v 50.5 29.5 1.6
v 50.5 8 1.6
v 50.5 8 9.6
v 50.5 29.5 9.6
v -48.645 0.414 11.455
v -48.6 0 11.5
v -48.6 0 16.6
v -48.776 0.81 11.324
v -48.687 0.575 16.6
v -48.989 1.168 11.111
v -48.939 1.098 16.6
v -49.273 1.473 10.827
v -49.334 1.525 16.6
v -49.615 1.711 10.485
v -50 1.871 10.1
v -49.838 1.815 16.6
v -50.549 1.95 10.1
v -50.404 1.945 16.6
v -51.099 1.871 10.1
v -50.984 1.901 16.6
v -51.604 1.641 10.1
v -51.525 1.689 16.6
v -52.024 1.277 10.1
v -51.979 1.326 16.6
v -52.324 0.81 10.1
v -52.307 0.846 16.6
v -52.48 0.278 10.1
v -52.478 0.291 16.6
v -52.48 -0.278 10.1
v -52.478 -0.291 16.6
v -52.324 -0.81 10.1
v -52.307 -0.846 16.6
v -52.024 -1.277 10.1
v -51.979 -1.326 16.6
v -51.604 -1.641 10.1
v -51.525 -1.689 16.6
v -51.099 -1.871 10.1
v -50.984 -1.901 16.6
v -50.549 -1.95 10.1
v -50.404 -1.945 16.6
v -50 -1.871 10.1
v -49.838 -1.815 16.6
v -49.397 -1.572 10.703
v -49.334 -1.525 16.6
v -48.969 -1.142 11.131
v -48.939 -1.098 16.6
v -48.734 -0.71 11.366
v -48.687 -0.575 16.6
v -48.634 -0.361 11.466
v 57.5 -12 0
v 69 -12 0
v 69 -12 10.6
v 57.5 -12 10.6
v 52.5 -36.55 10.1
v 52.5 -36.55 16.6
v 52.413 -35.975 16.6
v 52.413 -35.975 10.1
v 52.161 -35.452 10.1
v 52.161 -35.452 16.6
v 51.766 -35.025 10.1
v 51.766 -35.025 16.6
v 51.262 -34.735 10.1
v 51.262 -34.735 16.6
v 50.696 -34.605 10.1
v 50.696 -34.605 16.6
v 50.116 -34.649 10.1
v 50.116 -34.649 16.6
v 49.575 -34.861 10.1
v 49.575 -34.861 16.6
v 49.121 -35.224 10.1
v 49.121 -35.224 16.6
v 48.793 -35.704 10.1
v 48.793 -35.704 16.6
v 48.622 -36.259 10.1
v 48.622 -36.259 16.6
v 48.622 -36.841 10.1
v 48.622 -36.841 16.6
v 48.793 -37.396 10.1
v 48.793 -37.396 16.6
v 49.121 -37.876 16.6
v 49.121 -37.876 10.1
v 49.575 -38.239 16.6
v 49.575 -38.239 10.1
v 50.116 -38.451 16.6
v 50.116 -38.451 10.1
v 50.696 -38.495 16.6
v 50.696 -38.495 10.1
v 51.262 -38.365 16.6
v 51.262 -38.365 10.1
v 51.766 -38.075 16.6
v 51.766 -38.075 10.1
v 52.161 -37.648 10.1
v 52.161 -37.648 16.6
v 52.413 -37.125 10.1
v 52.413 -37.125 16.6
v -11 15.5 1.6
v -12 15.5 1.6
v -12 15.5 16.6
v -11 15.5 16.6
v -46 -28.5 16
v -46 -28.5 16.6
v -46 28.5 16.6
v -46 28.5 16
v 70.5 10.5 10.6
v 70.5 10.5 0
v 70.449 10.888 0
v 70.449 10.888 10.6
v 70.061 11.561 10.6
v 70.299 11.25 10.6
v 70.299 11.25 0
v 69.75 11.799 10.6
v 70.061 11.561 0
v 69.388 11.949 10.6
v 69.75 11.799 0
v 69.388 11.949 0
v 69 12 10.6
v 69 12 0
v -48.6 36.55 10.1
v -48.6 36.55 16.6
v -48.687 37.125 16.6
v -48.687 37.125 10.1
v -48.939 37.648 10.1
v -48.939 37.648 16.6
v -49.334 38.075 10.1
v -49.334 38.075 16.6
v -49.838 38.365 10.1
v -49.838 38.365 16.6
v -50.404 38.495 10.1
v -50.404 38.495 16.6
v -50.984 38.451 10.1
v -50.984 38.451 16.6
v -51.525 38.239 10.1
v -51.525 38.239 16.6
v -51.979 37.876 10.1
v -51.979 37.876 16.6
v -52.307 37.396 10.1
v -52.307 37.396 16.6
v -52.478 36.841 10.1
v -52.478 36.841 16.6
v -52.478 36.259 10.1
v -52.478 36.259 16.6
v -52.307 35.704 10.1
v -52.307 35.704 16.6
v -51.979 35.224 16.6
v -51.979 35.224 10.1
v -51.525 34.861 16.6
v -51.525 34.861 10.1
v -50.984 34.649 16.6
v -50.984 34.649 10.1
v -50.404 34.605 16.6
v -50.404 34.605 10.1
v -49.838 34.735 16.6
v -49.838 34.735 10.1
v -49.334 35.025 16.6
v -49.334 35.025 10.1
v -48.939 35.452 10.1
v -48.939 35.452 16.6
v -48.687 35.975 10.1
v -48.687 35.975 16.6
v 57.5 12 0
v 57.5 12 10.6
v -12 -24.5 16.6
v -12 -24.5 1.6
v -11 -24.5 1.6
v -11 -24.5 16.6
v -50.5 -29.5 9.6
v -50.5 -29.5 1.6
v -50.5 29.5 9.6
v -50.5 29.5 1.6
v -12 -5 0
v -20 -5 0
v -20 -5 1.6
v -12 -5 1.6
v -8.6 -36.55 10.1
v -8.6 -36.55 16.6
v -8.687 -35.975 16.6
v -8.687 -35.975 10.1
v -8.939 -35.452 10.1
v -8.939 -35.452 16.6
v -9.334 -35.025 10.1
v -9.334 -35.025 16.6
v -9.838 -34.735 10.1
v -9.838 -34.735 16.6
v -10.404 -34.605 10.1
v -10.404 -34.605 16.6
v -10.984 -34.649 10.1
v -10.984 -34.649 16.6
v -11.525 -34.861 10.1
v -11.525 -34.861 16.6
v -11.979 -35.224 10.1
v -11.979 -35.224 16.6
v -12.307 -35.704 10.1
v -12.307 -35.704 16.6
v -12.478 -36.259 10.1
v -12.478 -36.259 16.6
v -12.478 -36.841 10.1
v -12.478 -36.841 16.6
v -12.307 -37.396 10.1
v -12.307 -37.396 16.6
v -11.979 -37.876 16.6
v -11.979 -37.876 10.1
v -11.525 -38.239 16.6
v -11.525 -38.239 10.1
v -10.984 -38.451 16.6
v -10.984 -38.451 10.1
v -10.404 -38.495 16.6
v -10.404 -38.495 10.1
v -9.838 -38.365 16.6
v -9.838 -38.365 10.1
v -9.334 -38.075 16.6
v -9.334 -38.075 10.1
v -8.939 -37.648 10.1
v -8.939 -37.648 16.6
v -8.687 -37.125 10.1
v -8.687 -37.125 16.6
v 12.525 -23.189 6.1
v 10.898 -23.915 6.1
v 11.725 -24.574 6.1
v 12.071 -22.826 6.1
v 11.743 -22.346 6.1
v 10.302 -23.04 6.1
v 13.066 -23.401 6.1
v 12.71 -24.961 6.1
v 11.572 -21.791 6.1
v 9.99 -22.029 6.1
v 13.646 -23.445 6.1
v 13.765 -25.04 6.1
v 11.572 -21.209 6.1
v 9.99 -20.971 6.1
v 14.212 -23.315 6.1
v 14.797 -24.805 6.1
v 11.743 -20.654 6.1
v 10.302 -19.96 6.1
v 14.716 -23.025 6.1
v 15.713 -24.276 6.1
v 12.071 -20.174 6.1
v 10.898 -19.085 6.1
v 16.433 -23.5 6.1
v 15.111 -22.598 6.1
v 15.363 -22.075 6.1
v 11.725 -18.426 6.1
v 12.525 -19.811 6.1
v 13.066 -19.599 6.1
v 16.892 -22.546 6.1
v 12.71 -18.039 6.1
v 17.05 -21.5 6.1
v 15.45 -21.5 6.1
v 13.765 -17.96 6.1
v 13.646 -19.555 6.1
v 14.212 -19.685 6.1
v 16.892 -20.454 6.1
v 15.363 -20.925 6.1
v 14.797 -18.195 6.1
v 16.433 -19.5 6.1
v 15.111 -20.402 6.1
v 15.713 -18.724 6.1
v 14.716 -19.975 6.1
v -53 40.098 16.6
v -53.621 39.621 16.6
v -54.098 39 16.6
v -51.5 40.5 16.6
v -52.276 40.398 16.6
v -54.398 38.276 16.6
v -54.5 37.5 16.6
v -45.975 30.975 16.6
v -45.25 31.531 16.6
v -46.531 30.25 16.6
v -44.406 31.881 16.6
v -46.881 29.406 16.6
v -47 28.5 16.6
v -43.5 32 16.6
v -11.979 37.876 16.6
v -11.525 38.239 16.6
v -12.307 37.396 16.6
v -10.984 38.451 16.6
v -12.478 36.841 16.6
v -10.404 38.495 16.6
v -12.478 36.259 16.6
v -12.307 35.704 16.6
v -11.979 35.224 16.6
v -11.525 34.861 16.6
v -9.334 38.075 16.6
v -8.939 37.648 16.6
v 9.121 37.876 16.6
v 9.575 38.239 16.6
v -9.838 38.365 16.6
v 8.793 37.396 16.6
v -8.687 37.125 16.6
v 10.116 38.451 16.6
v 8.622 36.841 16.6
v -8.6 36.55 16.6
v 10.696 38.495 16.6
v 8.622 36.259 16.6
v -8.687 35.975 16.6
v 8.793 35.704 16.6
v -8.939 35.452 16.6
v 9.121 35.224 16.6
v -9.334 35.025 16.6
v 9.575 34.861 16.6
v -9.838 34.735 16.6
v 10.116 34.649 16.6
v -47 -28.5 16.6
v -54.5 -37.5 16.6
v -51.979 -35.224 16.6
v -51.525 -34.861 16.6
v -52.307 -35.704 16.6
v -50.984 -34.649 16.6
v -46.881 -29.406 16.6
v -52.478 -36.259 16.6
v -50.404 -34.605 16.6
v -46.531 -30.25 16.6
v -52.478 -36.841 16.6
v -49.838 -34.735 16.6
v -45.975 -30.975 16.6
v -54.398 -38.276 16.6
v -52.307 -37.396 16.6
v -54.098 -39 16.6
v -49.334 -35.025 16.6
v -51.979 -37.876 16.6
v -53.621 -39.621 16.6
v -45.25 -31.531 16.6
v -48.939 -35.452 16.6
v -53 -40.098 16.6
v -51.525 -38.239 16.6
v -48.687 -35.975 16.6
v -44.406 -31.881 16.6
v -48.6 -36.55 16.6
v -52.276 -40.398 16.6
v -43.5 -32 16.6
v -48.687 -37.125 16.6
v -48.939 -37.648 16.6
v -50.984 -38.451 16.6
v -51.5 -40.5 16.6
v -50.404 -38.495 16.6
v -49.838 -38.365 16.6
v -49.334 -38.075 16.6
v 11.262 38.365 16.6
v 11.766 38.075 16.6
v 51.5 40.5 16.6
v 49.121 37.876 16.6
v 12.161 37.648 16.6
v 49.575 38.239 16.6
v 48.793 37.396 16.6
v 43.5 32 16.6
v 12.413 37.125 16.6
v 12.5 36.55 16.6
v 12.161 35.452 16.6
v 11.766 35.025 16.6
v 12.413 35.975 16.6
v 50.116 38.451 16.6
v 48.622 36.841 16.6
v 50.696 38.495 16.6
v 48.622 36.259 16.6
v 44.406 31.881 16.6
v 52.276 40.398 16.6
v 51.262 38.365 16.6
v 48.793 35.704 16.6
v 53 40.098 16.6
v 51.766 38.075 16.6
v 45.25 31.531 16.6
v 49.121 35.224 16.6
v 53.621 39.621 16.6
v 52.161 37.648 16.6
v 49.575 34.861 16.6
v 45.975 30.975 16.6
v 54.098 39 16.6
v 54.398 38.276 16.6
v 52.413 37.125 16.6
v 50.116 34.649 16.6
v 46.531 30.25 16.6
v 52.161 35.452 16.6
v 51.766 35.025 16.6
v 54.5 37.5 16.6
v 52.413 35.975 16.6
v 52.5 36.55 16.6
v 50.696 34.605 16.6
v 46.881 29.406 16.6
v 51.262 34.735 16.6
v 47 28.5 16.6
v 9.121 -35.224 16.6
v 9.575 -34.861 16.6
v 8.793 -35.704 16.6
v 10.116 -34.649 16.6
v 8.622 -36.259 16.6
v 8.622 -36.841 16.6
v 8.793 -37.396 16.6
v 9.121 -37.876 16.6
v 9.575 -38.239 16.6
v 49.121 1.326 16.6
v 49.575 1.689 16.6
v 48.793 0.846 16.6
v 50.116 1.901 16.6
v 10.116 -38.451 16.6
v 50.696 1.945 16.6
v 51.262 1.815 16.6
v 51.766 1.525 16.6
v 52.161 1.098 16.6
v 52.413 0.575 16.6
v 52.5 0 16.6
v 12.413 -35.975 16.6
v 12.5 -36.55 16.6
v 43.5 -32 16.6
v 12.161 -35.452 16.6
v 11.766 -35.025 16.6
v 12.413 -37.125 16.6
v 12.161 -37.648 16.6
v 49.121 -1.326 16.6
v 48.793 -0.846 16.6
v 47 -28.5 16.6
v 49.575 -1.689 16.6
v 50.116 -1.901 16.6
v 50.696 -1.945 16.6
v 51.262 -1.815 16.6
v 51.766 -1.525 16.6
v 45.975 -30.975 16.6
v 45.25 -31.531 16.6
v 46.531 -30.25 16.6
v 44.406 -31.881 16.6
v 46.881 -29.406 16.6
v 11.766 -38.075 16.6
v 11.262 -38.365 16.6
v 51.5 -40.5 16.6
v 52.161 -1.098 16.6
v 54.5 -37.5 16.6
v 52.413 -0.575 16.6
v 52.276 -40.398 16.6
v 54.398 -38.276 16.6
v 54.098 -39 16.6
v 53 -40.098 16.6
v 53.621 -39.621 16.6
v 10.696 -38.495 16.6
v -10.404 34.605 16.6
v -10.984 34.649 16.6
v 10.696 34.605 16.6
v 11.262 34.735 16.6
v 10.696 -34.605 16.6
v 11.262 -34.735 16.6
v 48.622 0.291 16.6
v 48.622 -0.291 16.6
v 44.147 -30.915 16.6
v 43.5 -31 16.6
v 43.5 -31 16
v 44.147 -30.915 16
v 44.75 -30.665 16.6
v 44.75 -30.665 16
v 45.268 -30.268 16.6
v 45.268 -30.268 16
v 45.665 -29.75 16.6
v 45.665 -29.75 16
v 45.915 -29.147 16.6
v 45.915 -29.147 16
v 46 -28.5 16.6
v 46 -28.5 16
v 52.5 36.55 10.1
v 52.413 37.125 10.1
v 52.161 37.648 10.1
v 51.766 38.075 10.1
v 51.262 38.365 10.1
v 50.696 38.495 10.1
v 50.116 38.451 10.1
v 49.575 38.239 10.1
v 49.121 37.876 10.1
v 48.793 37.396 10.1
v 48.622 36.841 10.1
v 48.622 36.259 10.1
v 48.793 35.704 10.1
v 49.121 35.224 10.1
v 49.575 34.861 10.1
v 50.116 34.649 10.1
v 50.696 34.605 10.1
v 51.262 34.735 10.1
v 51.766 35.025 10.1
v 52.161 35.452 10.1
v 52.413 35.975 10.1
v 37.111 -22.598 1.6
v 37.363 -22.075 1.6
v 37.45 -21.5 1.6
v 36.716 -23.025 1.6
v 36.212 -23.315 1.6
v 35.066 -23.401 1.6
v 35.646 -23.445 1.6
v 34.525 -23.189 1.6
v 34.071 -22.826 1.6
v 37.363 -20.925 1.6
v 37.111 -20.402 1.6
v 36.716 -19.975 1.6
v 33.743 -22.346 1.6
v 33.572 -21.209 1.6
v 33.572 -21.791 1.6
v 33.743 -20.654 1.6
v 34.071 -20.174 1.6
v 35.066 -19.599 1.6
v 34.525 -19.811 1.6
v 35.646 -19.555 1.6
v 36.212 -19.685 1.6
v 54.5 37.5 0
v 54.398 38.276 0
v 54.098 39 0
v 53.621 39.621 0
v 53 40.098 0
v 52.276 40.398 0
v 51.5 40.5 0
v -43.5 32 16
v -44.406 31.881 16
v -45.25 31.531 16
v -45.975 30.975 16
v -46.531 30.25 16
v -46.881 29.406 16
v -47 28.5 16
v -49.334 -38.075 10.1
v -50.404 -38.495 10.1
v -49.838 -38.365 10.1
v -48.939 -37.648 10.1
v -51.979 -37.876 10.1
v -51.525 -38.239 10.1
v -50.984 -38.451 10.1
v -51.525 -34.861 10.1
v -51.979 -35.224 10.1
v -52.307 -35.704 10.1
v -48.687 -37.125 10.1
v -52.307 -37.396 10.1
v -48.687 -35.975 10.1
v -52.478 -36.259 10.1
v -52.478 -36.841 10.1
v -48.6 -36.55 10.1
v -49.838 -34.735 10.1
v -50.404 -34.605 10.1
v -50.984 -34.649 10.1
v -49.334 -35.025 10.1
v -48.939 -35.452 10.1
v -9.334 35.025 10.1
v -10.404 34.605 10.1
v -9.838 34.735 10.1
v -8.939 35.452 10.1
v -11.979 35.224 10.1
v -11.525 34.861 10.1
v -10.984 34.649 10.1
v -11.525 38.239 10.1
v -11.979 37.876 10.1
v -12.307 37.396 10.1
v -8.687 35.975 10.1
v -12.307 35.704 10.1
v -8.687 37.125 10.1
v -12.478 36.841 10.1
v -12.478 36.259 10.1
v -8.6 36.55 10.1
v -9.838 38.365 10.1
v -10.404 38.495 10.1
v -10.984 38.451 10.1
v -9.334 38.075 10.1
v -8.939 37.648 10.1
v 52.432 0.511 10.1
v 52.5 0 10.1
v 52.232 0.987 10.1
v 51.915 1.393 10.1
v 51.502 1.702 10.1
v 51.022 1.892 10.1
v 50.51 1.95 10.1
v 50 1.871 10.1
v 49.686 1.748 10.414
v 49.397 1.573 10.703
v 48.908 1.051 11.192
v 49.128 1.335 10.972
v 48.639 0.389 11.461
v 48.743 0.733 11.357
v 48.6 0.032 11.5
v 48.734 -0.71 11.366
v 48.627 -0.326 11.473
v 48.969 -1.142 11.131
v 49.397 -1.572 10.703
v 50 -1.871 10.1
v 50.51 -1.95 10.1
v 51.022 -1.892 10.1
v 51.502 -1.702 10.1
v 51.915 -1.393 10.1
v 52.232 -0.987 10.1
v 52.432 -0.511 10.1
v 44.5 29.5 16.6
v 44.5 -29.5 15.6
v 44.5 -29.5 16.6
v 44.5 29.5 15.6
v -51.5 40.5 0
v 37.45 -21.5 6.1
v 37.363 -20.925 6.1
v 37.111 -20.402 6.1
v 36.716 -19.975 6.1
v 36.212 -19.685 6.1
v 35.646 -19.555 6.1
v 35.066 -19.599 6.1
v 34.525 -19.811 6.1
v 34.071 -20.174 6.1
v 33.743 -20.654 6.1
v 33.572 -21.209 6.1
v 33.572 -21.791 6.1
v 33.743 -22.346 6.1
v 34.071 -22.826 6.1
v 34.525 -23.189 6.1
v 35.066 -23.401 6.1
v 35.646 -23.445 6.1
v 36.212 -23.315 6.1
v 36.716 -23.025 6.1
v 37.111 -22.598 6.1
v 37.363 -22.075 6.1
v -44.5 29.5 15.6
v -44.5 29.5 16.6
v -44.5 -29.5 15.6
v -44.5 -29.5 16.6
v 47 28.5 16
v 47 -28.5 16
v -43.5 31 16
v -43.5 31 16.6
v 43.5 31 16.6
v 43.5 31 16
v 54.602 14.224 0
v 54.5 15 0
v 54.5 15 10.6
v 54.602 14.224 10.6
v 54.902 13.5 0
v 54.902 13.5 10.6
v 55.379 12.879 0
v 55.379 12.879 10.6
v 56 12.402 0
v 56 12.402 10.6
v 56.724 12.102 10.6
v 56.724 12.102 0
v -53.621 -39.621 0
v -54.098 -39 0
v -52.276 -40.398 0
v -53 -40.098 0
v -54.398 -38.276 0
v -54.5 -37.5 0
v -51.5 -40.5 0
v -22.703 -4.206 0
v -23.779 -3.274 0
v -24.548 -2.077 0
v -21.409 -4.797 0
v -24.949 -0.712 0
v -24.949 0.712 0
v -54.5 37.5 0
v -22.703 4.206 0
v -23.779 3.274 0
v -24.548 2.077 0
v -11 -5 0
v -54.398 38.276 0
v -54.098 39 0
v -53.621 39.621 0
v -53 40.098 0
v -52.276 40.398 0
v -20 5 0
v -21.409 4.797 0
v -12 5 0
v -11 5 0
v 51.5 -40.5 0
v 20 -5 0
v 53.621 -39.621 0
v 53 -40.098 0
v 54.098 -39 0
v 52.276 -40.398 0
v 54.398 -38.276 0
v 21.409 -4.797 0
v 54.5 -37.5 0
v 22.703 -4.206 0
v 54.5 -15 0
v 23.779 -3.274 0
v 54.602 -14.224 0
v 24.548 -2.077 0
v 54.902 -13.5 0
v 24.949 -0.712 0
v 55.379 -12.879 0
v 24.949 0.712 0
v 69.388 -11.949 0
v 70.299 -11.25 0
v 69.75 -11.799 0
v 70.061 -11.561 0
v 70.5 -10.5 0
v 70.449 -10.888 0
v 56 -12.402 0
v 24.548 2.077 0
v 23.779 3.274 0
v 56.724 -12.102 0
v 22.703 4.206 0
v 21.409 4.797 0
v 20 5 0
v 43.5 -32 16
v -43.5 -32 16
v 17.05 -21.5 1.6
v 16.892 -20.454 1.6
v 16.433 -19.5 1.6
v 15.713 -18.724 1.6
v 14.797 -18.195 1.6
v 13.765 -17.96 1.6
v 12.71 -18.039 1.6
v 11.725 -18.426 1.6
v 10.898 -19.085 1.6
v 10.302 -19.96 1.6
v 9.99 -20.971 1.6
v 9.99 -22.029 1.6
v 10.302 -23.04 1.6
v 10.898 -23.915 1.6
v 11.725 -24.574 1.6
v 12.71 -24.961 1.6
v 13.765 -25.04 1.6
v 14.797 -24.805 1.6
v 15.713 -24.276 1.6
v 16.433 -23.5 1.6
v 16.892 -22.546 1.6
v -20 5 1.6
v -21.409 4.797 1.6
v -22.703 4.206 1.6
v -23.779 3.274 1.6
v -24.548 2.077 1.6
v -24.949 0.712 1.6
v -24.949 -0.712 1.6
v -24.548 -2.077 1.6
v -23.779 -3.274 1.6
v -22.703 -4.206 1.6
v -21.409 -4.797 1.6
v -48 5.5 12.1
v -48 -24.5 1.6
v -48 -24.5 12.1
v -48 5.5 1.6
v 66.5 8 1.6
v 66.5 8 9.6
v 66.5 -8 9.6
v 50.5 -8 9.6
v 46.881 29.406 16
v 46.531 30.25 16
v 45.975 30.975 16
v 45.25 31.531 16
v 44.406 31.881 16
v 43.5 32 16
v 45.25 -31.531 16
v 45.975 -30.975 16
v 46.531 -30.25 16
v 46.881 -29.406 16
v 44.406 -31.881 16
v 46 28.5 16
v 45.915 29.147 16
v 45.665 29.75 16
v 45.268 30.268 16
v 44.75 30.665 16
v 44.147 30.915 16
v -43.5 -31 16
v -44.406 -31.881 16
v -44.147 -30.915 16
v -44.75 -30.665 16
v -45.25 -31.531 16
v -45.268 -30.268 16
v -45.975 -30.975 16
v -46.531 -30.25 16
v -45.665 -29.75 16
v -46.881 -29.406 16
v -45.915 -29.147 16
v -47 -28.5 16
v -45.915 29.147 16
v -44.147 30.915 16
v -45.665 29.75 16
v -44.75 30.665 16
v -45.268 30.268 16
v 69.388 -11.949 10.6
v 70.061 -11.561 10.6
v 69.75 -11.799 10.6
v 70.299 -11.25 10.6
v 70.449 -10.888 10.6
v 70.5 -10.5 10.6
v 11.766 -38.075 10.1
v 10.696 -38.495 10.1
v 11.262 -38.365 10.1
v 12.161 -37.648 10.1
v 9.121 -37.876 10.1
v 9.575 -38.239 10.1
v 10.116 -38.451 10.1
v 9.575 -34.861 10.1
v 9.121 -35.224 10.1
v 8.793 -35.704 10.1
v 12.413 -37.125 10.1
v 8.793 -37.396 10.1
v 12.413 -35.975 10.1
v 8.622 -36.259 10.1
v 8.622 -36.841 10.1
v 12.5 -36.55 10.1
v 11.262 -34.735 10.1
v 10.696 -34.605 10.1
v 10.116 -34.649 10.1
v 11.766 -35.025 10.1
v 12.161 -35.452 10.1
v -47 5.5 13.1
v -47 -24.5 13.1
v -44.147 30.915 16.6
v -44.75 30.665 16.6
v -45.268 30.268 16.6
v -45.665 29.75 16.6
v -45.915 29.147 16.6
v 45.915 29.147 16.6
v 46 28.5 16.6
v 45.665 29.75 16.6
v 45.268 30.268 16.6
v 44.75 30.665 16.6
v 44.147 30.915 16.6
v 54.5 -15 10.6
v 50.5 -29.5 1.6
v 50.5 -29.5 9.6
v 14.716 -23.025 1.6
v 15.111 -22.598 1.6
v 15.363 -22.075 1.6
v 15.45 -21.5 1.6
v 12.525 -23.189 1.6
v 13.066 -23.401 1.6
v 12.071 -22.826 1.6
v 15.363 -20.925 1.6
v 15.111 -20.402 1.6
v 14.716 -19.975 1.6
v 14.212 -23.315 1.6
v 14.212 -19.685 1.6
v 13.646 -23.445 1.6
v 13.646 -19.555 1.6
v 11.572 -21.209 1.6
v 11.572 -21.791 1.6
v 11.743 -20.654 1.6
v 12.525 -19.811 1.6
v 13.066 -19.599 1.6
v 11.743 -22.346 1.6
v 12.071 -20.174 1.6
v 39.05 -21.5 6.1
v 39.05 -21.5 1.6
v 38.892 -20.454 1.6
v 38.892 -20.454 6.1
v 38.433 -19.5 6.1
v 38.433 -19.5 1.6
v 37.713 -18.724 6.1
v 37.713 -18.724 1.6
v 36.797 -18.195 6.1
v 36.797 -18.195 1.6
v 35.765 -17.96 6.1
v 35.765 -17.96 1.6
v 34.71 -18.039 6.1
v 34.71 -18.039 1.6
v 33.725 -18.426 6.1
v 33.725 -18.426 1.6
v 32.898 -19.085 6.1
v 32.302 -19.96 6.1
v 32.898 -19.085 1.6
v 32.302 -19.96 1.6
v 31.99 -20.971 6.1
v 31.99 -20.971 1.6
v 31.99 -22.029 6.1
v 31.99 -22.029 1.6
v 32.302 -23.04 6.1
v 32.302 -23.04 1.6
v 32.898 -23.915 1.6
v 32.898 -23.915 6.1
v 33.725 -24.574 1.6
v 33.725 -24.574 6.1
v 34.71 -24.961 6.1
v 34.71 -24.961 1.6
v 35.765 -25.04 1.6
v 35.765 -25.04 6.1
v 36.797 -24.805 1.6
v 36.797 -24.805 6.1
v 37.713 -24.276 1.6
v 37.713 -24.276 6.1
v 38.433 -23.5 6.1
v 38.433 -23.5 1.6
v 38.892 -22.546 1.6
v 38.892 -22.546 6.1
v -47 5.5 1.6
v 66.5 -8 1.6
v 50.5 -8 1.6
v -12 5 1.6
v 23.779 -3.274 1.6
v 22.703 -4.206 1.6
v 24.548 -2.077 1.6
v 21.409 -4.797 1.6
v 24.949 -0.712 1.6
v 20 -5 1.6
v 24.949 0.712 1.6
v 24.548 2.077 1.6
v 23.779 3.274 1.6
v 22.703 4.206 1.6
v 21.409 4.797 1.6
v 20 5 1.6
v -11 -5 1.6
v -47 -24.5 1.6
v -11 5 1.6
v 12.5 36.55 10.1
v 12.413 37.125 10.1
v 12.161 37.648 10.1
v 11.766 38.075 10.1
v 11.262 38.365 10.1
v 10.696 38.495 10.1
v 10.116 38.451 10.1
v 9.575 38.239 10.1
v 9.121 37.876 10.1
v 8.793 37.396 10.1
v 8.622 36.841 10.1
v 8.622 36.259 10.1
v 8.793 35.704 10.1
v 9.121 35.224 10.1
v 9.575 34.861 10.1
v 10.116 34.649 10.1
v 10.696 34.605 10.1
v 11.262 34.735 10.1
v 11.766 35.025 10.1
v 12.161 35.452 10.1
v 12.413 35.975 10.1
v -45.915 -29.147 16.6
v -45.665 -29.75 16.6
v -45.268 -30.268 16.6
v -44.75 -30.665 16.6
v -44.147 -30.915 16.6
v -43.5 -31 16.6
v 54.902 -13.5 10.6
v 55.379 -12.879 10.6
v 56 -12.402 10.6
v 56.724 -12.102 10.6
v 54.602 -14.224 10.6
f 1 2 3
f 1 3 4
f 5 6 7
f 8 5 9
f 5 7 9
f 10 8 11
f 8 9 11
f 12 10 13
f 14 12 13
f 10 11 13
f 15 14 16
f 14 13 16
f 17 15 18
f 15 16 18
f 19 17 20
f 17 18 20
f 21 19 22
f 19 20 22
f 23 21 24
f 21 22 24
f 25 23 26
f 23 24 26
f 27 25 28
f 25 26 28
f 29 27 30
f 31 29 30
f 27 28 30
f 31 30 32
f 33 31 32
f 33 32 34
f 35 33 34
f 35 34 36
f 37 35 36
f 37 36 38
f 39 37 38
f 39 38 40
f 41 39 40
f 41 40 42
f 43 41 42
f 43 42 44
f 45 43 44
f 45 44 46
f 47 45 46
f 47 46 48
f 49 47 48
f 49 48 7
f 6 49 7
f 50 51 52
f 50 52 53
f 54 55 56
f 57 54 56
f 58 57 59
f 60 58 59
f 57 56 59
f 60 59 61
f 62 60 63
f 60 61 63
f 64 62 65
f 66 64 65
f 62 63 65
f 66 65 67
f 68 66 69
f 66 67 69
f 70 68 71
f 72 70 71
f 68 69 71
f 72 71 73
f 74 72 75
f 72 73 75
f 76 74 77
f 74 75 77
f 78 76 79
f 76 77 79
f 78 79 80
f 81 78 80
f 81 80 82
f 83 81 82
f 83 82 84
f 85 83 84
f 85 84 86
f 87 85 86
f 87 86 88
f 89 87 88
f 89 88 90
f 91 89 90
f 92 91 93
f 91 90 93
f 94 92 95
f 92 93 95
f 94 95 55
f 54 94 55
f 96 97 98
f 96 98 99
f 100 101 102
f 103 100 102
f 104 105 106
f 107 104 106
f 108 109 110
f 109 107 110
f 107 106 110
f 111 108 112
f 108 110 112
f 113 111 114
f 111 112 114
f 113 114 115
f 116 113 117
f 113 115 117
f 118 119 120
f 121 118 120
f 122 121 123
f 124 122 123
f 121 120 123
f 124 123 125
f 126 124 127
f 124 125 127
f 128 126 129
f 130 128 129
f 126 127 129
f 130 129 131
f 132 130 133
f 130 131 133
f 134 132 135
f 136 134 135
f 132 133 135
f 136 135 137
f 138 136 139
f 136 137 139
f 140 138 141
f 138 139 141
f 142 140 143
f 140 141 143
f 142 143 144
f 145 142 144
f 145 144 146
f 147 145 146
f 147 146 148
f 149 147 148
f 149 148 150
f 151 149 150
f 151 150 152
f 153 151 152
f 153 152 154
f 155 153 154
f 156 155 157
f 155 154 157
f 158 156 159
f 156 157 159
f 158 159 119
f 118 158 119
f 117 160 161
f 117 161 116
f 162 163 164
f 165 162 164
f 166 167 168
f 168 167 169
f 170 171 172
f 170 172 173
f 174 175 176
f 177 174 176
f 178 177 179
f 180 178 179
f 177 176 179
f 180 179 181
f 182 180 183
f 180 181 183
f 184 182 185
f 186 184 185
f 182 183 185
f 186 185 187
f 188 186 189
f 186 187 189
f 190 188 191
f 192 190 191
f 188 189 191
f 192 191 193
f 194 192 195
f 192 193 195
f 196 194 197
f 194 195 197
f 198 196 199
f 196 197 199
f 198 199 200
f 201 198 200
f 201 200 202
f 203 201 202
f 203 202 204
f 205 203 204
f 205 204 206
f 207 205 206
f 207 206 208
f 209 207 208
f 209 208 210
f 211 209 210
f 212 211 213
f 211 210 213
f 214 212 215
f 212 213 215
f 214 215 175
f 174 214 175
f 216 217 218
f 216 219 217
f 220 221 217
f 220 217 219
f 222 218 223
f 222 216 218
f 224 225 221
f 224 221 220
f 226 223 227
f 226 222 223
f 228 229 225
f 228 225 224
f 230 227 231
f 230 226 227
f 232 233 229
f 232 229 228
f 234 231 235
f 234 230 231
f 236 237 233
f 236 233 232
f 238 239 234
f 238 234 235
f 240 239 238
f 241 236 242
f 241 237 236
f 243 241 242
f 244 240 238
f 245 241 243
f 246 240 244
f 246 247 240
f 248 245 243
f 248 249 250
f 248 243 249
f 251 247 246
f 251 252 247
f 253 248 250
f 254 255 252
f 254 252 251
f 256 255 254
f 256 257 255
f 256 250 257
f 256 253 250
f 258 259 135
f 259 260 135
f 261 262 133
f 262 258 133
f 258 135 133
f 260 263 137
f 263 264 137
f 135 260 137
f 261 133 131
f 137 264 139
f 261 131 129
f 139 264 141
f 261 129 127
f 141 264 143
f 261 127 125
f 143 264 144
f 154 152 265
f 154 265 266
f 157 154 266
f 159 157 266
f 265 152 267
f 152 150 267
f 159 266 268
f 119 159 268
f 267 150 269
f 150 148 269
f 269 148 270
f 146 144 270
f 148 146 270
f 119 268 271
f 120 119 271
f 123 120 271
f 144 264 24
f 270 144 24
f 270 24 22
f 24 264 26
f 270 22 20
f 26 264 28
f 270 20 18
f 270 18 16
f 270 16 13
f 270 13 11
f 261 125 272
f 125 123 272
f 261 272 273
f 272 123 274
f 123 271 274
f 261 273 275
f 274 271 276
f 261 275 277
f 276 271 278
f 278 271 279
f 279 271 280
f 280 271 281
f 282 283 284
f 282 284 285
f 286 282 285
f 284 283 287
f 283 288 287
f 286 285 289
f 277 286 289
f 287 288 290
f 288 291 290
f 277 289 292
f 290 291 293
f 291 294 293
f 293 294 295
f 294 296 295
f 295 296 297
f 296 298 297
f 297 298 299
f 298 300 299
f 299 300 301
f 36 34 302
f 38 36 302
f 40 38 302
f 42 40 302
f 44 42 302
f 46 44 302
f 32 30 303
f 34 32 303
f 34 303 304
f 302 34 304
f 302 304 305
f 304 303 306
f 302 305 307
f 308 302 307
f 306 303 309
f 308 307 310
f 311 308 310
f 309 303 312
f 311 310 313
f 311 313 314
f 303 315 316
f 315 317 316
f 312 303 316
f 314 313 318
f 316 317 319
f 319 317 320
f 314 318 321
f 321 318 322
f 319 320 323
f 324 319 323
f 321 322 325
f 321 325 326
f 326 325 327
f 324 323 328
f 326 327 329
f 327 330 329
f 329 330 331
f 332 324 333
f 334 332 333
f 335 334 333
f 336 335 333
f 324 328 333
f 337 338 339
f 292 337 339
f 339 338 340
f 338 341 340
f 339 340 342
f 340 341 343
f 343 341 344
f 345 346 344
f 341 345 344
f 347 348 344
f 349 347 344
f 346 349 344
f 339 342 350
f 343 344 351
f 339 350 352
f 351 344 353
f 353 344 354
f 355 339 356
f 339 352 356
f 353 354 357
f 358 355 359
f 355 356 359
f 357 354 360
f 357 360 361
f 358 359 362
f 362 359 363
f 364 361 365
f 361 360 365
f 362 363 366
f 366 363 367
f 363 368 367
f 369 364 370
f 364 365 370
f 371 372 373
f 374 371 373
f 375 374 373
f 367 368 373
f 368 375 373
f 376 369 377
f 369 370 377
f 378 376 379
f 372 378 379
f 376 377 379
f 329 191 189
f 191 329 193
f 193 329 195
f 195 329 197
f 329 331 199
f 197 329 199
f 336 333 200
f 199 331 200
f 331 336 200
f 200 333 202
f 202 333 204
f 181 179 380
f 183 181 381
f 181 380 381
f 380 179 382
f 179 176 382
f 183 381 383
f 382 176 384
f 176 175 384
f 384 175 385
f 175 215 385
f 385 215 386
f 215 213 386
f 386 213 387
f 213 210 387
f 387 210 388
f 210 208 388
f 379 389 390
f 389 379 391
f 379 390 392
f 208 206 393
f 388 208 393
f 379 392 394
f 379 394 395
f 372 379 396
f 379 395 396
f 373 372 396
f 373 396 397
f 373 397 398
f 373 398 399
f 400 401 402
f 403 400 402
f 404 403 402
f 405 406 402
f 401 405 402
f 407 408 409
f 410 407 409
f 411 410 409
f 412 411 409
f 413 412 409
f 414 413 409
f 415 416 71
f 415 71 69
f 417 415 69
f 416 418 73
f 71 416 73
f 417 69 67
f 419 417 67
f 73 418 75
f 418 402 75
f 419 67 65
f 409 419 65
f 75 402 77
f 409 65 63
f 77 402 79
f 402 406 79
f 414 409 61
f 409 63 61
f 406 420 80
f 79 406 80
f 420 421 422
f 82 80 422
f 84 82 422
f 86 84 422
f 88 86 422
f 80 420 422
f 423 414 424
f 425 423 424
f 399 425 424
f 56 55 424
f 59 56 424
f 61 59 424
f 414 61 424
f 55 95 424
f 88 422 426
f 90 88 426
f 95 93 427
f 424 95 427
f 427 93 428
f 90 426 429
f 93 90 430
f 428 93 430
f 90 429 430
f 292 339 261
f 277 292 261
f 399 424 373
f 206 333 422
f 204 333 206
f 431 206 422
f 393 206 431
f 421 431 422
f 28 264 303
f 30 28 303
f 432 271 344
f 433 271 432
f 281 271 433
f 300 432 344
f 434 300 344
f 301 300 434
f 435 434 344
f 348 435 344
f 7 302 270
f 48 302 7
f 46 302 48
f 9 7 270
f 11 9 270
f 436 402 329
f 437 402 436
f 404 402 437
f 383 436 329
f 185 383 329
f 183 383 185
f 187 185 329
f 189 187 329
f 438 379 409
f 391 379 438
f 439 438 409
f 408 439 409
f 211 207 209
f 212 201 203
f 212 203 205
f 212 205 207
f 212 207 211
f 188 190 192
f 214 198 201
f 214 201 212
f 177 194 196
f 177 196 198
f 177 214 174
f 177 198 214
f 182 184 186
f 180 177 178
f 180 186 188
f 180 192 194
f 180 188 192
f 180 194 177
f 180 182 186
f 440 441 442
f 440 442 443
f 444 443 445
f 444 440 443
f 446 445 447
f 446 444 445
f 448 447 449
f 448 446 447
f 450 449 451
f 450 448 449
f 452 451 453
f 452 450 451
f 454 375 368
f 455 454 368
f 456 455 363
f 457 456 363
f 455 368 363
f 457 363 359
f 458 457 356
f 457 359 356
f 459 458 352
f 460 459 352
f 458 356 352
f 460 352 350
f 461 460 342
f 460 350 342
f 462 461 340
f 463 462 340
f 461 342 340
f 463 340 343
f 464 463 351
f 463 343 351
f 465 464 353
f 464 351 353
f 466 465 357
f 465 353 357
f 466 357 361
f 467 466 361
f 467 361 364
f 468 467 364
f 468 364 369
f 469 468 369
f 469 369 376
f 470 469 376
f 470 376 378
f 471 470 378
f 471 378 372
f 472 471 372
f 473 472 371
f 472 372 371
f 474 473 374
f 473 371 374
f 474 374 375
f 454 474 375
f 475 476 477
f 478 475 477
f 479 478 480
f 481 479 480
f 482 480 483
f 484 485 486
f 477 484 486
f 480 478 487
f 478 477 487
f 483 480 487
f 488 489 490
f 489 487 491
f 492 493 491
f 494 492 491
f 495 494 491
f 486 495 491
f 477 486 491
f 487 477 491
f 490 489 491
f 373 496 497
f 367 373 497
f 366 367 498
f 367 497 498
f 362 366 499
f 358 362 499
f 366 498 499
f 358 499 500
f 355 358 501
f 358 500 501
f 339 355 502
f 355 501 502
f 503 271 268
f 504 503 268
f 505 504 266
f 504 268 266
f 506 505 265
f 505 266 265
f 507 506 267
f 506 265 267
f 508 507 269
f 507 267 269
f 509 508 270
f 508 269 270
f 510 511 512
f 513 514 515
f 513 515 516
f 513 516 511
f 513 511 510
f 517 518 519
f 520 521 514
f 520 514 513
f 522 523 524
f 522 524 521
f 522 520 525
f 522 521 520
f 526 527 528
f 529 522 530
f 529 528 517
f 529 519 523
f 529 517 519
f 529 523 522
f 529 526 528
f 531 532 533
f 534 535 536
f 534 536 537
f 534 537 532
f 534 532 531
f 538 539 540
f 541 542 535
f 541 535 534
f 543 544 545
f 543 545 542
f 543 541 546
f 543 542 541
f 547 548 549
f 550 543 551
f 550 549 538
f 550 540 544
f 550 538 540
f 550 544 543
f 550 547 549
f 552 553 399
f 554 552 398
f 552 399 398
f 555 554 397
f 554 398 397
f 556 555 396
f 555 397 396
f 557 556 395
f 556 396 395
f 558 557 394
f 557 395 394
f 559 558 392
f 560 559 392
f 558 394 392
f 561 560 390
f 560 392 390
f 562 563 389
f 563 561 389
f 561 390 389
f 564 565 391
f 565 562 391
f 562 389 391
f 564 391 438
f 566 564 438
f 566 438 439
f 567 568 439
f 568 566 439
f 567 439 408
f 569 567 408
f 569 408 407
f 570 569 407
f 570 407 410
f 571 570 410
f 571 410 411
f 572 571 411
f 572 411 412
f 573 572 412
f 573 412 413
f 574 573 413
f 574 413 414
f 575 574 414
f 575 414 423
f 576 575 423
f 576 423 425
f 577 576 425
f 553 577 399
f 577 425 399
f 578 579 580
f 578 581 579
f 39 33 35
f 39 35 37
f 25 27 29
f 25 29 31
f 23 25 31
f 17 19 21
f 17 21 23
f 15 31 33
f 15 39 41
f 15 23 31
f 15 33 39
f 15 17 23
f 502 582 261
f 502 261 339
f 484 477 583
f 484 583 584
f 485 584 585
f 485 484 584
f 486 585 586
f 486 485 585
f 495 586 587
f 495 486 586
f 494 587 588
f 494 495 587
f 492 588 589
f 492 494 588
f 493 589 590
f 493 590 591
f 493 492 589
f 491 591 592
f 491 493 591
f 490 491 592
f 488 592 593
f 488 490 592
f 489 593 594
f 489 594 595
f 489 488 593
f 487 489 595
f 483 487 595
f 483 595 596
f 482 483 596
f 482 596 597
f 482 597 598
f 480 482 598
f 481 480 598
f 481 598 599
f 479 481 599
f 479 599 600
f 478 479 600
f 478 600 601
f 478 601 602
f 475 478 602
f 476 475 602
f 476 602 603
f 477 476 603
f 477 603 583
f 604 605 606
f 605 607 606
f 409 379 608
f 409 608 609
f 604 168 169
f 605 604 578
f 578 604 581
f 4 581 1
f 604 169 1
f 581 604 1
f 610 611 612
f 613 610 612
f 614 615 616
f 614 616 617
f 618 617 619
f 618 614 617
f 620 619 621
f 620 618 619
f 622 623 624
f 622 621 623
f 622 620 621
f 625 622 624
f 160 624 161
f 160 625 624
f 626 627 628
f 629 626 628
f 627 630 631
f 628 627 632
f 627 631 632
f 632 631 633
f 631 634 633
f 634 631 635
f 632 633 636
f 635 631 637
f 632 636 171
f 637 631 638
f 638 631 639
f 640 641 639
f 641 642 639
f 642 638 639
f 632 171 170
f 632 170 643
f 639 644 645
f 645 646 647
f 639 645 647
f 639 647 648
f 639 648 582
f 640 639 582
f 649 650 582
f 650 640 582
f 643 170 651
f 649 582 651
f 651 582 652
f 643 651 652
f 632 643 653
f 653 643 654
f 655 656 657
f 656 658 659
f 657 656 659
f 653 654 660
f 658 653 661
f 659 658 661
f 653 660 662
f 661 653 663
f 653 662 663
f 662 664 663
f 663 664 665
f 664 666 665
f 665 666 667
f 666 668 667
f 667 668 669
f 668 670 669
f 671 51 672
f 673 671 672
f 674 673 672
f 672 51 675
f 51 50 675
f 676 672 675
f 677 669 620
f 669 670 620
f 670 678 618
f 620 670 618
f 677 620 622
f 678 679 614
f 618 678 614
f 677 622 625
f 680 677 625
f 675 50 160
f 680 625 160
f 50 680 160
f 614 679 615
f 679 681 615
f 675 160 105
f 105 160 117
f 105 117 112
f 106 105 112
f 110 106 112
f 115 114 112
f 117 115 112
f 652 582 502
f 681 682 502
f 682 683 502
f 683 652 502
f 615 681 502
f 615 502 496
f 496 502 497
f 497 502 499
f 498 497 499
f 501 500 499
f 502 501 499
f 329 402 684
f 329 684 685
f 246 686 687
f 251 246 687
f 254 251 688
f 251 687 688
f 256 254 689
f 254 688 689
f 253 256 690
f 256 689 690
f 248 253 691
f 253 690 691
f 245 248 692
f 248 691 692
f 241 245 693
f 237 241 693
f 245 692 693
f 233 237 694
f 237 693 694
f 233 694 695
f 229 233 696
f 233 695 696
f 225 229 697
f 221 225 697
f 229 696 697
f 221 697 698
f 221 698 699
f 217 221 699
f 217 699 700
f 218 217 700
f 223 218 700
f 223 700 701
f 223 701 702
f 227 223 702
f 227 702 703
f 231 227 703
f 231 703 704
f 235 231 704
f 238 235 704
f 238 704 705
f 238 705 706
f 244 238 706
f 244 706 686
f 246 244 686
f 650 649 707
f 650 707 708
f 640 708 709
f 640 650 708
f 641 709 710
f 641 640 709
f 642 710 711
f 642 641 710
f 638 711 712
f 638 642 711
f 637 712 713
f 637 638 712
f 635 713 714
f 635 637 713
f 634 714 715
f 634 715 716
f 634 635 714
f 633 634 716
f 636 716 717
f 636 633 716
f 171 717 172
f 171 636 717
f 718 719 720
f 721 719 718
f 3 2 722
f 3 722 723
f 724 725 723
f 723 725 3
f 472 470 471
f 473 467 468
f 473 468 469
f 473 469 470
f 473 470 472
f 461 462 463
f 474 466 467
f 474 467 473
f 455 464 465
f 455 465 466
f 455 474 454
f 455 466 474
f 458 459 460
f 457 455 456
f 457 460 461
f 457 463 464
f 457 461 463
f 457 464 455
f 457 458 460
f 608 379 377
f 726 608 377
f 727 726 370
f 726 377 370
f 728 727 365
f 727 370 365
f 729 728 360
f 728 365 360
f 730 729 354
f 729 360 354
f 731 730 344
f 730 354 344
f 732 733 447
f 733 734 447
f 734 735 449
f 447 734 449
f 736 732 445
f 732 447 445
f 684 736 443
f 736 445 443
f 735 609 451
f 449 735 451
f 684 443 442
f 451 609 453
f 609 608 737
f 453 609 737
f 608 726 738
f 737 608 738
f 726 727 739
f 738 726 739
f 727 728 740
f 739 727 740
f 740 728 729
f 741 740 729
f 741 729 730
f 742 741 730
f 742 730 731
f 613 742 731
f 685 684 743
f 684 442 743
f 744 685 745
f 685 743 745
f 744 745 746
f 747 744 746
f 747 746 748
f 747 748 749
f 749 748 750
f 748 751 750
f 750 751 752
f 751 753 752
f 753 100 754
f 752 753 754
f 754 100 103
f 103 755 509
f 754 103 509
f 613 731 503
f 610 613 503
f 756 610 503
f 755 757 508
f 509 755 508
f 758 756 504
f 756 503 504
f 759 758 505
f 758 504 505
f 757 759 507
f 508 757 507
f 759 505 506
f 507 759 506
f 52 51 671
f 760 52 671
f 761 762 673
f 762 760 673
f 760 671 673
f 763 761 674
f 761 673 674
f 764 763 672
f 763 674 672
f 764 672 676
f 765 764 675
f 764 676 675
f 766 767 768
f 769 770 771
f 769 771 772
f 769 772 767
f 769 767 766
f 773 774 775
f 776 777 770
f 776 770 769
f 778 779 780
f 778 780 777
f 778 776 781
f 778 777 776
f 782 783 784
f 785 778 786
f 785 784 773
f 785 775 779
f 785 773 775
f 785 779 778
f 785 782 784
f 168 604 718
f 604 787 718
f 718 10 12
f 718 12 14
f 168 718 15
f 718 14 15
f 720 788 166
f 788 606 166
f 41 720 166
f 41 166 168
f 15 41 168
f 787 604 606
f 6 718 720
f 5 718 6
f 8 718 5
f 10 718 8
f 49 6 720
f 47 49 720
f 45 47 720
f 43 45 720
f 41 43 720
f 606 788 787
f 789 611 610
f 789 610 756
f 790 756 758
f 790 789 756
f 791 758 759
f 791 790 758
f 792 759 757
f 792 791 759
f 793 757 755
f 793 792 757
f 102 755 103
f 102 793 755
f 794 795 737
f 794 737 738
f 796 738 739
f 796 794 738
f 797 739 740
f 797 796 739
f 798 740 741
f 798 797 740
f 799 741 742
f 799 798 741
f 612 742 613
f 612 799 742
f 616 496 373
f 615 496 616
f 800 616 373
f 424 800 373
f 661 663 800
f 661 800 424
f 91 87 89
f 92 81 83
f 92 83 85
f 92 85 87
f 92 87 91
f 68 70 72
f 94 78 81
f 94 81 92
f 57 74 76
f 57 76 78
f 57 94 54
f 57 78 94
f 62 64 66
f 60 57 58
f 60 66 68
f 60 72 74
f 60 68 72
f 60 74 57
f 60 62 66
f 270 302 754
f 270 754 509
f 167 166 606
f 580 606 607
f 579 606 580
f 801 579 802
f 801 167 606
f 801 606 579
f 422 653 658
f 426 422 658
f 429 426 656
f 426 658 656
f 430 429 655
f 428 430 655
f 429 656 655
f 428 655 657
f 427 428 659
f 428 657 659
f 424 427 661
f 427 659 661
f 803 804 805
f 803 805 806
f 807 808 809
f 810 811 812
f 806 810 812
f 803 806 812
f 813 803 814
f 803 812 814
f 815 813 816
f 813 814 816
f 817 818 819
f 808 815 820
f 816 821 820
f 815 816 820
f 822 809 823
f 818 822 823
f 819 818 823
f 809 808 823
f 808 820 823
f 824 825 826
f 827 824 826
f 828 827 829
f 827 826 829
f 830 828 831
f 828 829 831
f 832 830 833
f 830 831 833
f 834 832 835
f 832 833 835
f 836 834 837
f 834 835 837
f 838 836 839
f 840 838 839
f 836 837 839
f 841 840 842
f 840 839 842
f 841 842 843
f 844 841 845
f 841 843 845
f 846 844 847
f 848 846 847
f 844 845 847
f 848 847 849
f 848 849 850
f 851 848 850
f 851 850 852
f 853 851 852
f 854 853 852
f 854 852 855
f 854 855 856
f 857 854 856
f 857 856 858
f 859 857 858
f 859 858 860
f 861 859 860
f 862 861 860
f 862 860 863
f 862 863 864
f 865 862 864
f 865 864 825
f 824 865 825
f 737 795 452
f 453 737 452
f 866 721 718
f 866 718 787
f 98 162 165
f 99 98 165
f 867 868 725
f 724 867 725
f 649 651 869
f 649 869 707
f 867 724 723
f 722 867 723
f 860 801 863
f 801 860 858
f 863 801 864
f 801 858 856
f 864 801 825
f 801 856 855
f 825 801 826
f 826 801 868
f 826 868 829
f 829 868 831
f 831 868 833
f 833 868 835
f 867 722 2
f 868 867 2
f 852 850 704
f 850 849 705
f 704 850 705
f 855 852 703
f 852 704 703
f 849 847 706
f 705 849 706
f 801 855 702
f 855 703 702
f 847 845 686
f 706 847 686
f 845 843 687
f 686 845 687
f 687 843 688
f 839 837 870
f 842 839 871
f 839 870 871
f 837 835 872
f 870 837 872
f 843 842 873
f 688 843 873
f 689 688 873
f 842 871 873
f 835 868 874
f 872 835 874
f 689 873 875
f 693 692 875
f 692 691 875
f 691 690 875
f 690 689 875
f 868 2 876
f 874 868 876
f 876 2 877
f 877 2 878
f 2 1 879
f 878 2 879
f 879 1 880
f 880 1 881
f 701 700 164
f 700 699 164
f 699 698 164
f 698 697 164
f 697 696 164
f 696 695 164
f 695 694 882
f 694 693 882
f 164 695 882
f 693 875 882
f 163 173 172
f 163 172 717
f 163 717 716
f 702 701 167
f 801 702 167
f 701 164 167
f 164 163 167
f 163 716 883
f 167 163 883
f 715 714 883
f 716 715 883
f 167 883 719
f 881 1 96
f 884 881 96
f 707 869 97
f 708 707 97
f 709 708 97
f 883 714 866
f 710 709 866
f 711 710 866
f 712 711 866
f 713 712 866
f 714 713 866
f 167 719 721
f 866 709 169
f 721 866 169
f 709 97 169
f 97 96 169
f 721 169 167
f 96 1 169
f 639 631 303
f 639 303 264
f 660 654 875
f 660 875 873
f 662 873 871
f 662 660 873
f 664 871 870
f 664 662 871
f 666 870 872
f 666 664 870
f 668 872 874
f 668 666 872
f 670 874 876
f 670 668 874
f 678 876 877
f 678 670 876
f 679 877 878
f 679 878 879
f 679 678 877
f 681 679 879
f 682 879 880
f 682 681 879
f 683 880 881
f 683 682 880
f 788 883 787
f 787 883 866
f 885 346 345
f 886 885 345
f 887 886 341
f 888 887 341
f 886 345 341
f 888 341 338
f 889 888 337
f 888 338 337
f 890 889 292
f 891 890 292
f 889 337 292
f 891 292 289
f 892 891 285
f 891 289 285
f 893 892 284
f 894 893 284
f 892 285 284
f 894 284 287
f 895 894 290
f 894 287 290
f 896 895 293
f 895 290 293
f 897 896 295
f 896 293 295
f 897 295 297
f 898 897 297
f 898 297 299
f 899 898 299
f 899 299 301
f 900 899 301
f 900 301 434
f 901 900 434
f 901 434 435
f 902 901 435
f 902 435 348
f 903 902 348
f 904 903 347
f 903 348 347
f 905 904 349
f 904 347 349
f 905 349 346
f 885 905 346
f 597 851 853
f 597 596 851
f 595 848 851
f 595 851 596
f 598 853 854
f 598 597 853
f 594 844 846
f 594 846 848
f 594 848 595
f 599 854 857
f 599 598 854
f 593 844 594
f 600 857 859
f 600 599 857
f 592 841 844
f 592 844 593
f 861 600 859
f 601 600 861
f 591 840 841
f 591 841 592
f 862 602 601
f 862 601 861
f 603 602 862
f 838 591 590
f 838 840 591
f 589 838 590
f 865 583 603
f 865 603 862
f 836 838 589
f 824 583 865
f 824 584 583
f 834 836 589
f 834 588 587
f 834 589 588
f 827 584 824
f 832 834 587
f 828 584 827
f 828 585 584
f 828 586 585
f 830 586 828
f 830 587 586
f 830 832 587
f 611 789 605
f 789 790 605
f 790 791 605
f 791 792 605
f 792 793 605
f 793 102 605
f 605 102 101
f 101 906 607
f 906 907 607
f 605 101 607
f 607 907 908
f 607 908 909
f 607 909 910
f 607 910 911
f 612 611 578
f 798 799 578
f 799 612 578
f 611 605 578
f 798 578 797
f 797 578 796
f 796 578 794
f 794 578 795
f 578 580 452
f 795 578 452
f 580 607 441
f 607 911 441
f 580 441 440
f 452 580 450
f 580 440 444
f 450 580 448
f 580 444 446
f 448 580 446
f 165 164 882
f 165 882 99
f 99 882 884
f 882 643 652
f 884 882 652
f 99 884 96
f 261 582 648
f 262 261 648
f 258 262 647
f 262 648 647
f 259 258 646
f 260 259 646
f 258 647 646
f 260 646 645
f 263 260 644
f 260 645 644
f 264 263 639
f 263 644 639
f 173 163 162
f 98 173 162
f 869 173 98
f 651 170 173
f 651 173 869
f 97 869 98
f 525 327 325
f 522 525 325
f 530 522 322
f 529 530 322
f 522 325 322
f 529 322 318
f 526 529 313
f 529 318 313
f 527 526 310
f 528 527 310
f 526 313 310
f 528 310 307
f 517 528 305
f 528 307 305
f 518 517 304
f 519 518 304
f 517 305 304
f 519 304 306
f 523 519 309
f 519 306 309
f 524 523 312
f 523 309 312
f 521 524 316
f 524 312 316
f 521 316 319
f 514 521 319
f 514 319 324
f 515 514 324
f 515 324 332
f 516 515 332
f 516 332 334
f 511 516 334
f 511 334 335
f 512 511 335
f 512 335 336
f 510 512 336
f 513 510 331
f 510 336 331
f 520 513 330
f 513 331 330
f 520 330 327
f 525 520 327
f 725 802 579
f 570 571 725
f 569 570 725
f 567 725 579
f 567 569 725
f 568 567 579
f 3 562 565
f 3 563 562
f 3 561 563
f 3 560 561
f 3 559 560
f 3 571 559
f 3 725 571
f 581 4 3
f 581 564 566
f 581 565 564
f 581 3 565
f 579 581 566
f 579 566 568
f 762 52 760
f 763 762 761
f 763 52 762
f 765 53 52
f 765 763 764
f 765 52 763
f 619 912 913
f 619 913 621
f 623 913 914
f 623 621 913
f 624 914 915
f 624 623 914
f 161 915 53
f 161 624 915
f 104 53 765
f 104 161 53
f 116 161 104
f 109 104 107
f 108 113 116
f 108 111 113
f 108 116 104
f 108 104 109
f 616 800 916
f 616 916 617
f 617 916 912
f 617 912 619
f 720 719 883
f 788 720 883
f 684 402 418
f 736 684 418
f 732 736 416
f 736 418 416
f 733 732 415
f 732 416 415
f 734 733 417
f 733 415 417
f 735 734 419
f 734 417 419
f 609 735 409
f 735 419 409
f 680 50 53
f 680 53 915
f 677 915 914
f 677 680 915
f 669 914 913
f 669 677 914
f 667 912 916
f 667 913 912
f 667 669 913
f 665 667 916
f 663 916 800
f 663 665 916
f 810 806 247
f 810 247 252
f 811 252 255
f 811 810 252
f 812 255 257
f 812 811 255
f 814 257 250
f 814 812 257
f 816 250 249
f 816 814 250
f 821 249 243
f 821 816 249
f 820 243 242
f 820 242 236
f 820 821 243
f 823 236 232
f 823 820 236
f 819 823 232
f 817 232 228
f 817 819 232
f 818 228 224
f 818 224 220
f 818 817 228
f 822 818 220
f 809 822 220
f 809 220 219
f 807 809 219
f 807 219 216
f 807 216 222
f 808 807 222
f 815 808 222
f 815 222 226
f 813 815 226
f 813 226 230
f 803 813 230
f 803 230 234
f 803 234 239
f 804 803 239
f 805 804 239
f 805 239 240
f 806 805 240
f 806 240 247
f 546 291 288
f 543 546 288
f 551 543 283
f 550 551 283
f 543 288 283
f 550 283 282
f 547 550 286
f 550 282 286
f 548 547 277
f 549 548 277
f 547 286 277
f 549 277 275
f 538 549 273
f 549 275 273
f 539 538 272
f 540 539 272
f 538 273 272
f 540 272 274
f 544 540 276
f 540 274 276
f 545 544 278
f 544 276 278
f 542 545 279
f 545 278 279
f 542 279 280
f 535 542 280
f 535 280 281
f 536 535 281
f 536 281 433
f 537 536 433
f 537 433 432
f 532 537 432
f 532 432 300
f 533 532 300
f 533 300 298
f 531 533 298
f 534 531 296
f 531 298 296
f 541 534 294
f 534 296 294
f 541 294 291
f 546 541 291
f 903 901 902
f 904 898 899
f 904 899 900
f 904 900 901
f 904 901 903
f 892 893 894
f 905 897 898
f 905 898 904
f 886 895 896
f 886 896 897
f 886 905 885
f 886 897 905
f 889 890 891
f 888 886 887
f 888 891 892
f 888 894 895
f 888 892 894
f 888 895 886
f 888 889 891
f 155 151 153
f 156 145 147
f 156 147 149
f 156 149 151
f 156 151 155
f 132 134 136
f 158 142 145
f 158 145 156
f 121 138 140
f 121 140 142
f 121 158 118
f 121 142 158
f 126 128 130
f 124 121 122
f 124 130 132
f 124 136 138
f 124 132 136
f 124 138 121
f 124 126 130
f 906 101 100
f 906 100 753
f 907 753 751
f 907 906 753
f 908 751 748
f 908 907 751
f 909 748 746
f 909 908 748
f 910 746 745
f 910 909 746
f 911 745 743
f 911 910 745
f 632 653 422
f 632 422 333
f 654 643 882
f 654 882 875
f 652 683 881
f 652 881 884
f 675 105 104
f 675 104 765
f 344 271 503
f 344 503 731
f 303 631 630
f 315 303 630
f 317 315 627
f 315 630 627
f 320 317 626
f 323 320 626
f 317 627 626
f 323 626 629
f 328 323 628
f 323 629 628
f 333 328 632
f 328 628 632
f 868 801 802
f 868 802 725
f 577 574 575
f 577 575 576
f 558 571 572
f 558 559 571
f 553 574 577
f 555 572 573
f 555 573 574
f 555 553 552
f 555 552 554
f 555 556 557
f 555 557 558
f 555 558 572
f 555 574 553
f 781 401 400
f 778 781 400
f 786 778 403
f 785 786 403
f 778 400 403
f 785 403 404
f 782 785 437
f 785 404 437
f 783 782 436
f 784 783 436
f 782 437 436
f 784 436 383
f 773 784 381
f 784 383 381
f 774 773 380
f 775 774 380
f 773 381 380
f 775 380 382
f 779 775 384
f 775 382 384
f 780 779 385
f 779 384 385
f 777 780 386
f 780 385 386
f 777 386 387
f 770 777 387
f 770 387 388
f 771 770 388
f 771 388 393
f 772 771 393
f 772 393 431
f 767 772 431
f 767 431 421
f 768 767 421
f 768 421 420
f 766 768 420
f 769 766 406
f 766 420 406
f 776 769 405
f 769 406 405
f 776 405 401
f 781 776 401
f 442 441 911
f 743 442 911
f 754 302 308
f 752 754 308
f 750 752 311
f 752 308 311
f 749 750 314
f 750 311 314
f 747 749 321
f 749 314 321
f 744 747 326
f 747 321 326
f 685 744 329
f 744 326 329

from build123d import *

# Parameters (mm, degrees)
PAD_DEPTH       = 1.6
SKETCH_W        = 101
SKETCH_H        = 59
SKETCH_W_2      = 1
SKETCH_H_2      = 30
SKETCH_H_3      = 40
PAD001_DEPTH    = 16.6
SKETCH002_W     = 16
SKETCH002_H     = 30
POCKET_DEPTH    = 6
SKETCH003_W     = 16
SKETCH003_H     = 8
POCKET001_DEPTH = 16
SKETCH005_R     = 3.55
SKETCH005_R_2   = 1.95
PAD002_DEPTH    = 6.1
PAD005_DEPTH    = 29.5
POCKET003_DEPTH = 0.6
SKETCH004_R     = 1.95
POCKET002_DEPTH = 6.5


with BuildPart() as part:
    # Sketch001 → Pad (new body)
    with BuildSketch(Plane.XY):
        with BuildLine():
            Line((-51.5, 40.5), (51.5, 40.5))
            ThreePointArc((54.5, 37.5), (53.62132, 39.62132), (51.5, 40.5))
            Line((54.5, 37.5), (54.5, 15))
            ThreePointArc((54.5, 15), (55.37868, 12.87868), (57.5, 12))
            Line((57.5, 12), (69, 12))
            ThreePointArc((70.5, 10.5), (70.06066, 11.56066), (69, 12))
            Line((70.5, 10.5), (70.5, -10.5))
            ThreePointArc((69, -12), (70.06066, -11.56066), (70.5, -10.5))
            Line((69, -12), (57.5, -12))
            ThreePointArc((57.5, -12), (55.37868, -12.87868), (54.5, -15))
            Line((54.5, -15), (54.5, -37.5))
            ThreePointArc((51.5, -40.5), (53.62132, -39.62132), (54.5, -37.5))
            Line((51.5, -40.5), (-51.5, -40.5))
            ThreePointArc((-54.5, -37.5), (-53.62132, -39.62132), (-51.5, -40.5))
            Line((-54.5, -37.5), (-54.5, 37.5))
            ThreePointArc((-51.5, 40.5), (-53.62132, 39.62132), (-54.5, 37.5))
        make_face()
        with BuildLine():
            ThreePointArc((-20, 5), (-25, 0), (-20, -5))
            Line((-20, -5), (20, -5))
            ThreePointArc((20, -5), (25, 0), (20, 5))
            Line((20, 5), (-20, 5))
        make_face(mode=Mode.SUBTRACT)
    extrude(amount=PAD_DEPTH)

    # Sketch → Pad001 (join)
    with BuildSketch(Plane.XY):
        with BuildLine():
            Line((-51.5, 40.5), (51.5, 40.5))
            ThreePointArc((54.5, 37.5), (53.62132, 39.62132), (51.5, 40.5))
            Line((54.5, 37.5), (54.5, 15))
            ThreePointArc((54.5, 15), (55.37868, 12.87868), (57.5, 12))
            Line((57.5, 12), (69, 12))
            ThreePointArc((70.5, 10.5), (70.06066, 11.56066), (69, 12))
            Line((70.5, 10.5), (70.5, -10.5))
            ThreePointArc((69, -12), (70.06066, -11.56066), (70.5, -10.5))
            Line((69, -12), (57.5, -12))
            ThreePointArc((57.5, -12), (55.37868, -12.87868), (54.5, -15))
            Line((54.5, -15), (54.5, -37.5))
            ThreePointArc((51.5, -40.5), (53.62132, -39.62132), (54.5, -37.5))
            Line((51.5, -40.5), (-51.5, -40.5))
            ThreePointArc((-54.5, -37.5), (-53.62132, -39.62132), (-51.5, -40.5))
            Line((-54.5, -37.5), (-54.5, 37.5))
            ThreePointArc((-51.5, 40.5), (-53.62132, 39.62132), (-54.5, 37.5))
        make_face()
        Rectangle(SKETCH_W, SKETCH_H, mode=Mode.SUBTRACT)
        with Locations((-47.5, -9.5)):
            Rectangle(SKETCH_W_2, SKETCH_H_2)
        with Locations((-11.5, -4.5)):
            Rectangle(SKETCH_W_2, SKETCH_H_3)
    extrude(amount=PAD001_DEPTH)

    # Sketch002 (on DatumPlane) → Pocket (cut)
    with BuildSketch(Plane.XY.offset(16.6)):
        with Locations((62.5, 0)):
            Rectangle(SKETCH002_W, SKETCH002_H)
    extrude(amount=-POCKET_DEPTH, mode=Mode.SUBTRACT)

    # Sketch003 (on DatumPlane) → Pocket001 (cut)
    with BuildSketch(Plane.YZ.offset(50.5)):
        with Locations((0, 5.6)):
            Rectangle(SKETCH003_W, SKETCH003_H)
    extrude(amount=POCKET001_DEPTH, mode=Mode.SUBTRACT)

    # Sketch005 → Pad002 (join)
    with BuildSketch(Plane.XY):
        with Locations((13.5, -21.5)):
            Circle(SKETCH005_R)
        with Locations((13.5, -21.5)):
            Circle(SKETCH005_R_2, mode=Mode.SUBTRACT)
        with Locations((35.5, -21.5)):
            Circle(SKETCH005_R)
        with Locations((35.5, -21.5)):
            Circle(SKETCH005_R_2, mode=Mode.SUBTRACT)
    extrude(amount=PAD002_DEPTH)

    # Sketch010 → Pad005 (join, symmetric)
    with BuildSketch(Plane.XZ):
        Polygon((44.5, 16.6), (50.5, 16.6), (50.5, 9.6), (44.5, 15.6), align=None)
        Polygon((-50.5, 16.6), (-44.5, 16.6), (-44.5, 15.6), (-50.5, 9.6), align=None)
    extrude(amount=PAD005_DEPTH, both=True)

    # Sketch006 (on DatumPlane) → Pocket003 (cut)
    with BuildSketch(Plane.XY.offset(16.6)):
        with BuildLine():
            Line((-43.5, 32), (43.5, 32))
            ThreePointArc((47, 28.5), (45.974874, 30.974874), (43.5, 32))
            Line((47, 28.5), (47, -28.5))
            ThreePointArc((43.5, -32), (45.974874, -30.974874), (47, -28.5))
            Line((43.5, -32), (-43.5, -32))
            ThreePointArc((-47, -28.5), (-45.974874, -30.974874), (-43.5, -32))
            Line((-47, -28.5), (-47, 28.5))
            ThreePointArc((-43.5, 32), (-45.974874, 30.974874), (-47, 28.5))
        make_face()
        with BuildLine():
            Line((-43.5, 31), (43.5, 31))
            ThreePointArc((46, 28.5), (45.267767, 30.267767), (43.5, 31))
            Line((46, 28.5), (46, -28.5))
            ThreePointArc((43.5, -31), (45.267767, -30.267767), (46, -28.5))
            Line((43.5, -31), (-43.5, -31))
            ThreePointArc((-46, -28.5), (-45.267767, -30.267767), (-43.5, -31))
            Line((-46, -28.5), (-46, 28.5))
            ThreePointArc((-43.5, 31), (-45.267767, 30.267767), (-46, 28.5))
        make_face(mode=Mode.SUBTRACT)
    extrude(amount=-POCKET003_DEPTH, mode=Mode.SUBTRACT)

    # Sketch004 (on DatumPlane) → Pocket002 (cut)
    with BuildSketch(Plane.XY.offset(16.6)):
        with Locations((-50.55, 36.55)):
            Circle(SKETCH004_R)
        with Locations((-10.55, 36.55)):
            Circle(SKETCH004_R)
        with Locations((10.55, 36.55)):
            Circle(SKETCH004_R)
        with Locations((50.55, 36.55)):
            Circle(SKETCH004_R)
        with Locations((50.55, -36.55)):
            Circle(SKETCH004_R)
        with Locations((10.55, -36.55)):
            Circle(SKETCH004_R)
        with Locations((-10.55, -36.55)):
            Circle(SKETCH004_R)
        with Locations((-50.55, -36.55)):
            Circle(SKETCH004_R)
        with Locations((-50.55, 0)):
            Circle(SKETCH004_R)
        with Locations((50.55, 0)):
            Circle(SKETCH004_R)
    extrude(amount=-POCKET002_DEPTH, mode=Mode.SUBTRACT)


solid = part.part
